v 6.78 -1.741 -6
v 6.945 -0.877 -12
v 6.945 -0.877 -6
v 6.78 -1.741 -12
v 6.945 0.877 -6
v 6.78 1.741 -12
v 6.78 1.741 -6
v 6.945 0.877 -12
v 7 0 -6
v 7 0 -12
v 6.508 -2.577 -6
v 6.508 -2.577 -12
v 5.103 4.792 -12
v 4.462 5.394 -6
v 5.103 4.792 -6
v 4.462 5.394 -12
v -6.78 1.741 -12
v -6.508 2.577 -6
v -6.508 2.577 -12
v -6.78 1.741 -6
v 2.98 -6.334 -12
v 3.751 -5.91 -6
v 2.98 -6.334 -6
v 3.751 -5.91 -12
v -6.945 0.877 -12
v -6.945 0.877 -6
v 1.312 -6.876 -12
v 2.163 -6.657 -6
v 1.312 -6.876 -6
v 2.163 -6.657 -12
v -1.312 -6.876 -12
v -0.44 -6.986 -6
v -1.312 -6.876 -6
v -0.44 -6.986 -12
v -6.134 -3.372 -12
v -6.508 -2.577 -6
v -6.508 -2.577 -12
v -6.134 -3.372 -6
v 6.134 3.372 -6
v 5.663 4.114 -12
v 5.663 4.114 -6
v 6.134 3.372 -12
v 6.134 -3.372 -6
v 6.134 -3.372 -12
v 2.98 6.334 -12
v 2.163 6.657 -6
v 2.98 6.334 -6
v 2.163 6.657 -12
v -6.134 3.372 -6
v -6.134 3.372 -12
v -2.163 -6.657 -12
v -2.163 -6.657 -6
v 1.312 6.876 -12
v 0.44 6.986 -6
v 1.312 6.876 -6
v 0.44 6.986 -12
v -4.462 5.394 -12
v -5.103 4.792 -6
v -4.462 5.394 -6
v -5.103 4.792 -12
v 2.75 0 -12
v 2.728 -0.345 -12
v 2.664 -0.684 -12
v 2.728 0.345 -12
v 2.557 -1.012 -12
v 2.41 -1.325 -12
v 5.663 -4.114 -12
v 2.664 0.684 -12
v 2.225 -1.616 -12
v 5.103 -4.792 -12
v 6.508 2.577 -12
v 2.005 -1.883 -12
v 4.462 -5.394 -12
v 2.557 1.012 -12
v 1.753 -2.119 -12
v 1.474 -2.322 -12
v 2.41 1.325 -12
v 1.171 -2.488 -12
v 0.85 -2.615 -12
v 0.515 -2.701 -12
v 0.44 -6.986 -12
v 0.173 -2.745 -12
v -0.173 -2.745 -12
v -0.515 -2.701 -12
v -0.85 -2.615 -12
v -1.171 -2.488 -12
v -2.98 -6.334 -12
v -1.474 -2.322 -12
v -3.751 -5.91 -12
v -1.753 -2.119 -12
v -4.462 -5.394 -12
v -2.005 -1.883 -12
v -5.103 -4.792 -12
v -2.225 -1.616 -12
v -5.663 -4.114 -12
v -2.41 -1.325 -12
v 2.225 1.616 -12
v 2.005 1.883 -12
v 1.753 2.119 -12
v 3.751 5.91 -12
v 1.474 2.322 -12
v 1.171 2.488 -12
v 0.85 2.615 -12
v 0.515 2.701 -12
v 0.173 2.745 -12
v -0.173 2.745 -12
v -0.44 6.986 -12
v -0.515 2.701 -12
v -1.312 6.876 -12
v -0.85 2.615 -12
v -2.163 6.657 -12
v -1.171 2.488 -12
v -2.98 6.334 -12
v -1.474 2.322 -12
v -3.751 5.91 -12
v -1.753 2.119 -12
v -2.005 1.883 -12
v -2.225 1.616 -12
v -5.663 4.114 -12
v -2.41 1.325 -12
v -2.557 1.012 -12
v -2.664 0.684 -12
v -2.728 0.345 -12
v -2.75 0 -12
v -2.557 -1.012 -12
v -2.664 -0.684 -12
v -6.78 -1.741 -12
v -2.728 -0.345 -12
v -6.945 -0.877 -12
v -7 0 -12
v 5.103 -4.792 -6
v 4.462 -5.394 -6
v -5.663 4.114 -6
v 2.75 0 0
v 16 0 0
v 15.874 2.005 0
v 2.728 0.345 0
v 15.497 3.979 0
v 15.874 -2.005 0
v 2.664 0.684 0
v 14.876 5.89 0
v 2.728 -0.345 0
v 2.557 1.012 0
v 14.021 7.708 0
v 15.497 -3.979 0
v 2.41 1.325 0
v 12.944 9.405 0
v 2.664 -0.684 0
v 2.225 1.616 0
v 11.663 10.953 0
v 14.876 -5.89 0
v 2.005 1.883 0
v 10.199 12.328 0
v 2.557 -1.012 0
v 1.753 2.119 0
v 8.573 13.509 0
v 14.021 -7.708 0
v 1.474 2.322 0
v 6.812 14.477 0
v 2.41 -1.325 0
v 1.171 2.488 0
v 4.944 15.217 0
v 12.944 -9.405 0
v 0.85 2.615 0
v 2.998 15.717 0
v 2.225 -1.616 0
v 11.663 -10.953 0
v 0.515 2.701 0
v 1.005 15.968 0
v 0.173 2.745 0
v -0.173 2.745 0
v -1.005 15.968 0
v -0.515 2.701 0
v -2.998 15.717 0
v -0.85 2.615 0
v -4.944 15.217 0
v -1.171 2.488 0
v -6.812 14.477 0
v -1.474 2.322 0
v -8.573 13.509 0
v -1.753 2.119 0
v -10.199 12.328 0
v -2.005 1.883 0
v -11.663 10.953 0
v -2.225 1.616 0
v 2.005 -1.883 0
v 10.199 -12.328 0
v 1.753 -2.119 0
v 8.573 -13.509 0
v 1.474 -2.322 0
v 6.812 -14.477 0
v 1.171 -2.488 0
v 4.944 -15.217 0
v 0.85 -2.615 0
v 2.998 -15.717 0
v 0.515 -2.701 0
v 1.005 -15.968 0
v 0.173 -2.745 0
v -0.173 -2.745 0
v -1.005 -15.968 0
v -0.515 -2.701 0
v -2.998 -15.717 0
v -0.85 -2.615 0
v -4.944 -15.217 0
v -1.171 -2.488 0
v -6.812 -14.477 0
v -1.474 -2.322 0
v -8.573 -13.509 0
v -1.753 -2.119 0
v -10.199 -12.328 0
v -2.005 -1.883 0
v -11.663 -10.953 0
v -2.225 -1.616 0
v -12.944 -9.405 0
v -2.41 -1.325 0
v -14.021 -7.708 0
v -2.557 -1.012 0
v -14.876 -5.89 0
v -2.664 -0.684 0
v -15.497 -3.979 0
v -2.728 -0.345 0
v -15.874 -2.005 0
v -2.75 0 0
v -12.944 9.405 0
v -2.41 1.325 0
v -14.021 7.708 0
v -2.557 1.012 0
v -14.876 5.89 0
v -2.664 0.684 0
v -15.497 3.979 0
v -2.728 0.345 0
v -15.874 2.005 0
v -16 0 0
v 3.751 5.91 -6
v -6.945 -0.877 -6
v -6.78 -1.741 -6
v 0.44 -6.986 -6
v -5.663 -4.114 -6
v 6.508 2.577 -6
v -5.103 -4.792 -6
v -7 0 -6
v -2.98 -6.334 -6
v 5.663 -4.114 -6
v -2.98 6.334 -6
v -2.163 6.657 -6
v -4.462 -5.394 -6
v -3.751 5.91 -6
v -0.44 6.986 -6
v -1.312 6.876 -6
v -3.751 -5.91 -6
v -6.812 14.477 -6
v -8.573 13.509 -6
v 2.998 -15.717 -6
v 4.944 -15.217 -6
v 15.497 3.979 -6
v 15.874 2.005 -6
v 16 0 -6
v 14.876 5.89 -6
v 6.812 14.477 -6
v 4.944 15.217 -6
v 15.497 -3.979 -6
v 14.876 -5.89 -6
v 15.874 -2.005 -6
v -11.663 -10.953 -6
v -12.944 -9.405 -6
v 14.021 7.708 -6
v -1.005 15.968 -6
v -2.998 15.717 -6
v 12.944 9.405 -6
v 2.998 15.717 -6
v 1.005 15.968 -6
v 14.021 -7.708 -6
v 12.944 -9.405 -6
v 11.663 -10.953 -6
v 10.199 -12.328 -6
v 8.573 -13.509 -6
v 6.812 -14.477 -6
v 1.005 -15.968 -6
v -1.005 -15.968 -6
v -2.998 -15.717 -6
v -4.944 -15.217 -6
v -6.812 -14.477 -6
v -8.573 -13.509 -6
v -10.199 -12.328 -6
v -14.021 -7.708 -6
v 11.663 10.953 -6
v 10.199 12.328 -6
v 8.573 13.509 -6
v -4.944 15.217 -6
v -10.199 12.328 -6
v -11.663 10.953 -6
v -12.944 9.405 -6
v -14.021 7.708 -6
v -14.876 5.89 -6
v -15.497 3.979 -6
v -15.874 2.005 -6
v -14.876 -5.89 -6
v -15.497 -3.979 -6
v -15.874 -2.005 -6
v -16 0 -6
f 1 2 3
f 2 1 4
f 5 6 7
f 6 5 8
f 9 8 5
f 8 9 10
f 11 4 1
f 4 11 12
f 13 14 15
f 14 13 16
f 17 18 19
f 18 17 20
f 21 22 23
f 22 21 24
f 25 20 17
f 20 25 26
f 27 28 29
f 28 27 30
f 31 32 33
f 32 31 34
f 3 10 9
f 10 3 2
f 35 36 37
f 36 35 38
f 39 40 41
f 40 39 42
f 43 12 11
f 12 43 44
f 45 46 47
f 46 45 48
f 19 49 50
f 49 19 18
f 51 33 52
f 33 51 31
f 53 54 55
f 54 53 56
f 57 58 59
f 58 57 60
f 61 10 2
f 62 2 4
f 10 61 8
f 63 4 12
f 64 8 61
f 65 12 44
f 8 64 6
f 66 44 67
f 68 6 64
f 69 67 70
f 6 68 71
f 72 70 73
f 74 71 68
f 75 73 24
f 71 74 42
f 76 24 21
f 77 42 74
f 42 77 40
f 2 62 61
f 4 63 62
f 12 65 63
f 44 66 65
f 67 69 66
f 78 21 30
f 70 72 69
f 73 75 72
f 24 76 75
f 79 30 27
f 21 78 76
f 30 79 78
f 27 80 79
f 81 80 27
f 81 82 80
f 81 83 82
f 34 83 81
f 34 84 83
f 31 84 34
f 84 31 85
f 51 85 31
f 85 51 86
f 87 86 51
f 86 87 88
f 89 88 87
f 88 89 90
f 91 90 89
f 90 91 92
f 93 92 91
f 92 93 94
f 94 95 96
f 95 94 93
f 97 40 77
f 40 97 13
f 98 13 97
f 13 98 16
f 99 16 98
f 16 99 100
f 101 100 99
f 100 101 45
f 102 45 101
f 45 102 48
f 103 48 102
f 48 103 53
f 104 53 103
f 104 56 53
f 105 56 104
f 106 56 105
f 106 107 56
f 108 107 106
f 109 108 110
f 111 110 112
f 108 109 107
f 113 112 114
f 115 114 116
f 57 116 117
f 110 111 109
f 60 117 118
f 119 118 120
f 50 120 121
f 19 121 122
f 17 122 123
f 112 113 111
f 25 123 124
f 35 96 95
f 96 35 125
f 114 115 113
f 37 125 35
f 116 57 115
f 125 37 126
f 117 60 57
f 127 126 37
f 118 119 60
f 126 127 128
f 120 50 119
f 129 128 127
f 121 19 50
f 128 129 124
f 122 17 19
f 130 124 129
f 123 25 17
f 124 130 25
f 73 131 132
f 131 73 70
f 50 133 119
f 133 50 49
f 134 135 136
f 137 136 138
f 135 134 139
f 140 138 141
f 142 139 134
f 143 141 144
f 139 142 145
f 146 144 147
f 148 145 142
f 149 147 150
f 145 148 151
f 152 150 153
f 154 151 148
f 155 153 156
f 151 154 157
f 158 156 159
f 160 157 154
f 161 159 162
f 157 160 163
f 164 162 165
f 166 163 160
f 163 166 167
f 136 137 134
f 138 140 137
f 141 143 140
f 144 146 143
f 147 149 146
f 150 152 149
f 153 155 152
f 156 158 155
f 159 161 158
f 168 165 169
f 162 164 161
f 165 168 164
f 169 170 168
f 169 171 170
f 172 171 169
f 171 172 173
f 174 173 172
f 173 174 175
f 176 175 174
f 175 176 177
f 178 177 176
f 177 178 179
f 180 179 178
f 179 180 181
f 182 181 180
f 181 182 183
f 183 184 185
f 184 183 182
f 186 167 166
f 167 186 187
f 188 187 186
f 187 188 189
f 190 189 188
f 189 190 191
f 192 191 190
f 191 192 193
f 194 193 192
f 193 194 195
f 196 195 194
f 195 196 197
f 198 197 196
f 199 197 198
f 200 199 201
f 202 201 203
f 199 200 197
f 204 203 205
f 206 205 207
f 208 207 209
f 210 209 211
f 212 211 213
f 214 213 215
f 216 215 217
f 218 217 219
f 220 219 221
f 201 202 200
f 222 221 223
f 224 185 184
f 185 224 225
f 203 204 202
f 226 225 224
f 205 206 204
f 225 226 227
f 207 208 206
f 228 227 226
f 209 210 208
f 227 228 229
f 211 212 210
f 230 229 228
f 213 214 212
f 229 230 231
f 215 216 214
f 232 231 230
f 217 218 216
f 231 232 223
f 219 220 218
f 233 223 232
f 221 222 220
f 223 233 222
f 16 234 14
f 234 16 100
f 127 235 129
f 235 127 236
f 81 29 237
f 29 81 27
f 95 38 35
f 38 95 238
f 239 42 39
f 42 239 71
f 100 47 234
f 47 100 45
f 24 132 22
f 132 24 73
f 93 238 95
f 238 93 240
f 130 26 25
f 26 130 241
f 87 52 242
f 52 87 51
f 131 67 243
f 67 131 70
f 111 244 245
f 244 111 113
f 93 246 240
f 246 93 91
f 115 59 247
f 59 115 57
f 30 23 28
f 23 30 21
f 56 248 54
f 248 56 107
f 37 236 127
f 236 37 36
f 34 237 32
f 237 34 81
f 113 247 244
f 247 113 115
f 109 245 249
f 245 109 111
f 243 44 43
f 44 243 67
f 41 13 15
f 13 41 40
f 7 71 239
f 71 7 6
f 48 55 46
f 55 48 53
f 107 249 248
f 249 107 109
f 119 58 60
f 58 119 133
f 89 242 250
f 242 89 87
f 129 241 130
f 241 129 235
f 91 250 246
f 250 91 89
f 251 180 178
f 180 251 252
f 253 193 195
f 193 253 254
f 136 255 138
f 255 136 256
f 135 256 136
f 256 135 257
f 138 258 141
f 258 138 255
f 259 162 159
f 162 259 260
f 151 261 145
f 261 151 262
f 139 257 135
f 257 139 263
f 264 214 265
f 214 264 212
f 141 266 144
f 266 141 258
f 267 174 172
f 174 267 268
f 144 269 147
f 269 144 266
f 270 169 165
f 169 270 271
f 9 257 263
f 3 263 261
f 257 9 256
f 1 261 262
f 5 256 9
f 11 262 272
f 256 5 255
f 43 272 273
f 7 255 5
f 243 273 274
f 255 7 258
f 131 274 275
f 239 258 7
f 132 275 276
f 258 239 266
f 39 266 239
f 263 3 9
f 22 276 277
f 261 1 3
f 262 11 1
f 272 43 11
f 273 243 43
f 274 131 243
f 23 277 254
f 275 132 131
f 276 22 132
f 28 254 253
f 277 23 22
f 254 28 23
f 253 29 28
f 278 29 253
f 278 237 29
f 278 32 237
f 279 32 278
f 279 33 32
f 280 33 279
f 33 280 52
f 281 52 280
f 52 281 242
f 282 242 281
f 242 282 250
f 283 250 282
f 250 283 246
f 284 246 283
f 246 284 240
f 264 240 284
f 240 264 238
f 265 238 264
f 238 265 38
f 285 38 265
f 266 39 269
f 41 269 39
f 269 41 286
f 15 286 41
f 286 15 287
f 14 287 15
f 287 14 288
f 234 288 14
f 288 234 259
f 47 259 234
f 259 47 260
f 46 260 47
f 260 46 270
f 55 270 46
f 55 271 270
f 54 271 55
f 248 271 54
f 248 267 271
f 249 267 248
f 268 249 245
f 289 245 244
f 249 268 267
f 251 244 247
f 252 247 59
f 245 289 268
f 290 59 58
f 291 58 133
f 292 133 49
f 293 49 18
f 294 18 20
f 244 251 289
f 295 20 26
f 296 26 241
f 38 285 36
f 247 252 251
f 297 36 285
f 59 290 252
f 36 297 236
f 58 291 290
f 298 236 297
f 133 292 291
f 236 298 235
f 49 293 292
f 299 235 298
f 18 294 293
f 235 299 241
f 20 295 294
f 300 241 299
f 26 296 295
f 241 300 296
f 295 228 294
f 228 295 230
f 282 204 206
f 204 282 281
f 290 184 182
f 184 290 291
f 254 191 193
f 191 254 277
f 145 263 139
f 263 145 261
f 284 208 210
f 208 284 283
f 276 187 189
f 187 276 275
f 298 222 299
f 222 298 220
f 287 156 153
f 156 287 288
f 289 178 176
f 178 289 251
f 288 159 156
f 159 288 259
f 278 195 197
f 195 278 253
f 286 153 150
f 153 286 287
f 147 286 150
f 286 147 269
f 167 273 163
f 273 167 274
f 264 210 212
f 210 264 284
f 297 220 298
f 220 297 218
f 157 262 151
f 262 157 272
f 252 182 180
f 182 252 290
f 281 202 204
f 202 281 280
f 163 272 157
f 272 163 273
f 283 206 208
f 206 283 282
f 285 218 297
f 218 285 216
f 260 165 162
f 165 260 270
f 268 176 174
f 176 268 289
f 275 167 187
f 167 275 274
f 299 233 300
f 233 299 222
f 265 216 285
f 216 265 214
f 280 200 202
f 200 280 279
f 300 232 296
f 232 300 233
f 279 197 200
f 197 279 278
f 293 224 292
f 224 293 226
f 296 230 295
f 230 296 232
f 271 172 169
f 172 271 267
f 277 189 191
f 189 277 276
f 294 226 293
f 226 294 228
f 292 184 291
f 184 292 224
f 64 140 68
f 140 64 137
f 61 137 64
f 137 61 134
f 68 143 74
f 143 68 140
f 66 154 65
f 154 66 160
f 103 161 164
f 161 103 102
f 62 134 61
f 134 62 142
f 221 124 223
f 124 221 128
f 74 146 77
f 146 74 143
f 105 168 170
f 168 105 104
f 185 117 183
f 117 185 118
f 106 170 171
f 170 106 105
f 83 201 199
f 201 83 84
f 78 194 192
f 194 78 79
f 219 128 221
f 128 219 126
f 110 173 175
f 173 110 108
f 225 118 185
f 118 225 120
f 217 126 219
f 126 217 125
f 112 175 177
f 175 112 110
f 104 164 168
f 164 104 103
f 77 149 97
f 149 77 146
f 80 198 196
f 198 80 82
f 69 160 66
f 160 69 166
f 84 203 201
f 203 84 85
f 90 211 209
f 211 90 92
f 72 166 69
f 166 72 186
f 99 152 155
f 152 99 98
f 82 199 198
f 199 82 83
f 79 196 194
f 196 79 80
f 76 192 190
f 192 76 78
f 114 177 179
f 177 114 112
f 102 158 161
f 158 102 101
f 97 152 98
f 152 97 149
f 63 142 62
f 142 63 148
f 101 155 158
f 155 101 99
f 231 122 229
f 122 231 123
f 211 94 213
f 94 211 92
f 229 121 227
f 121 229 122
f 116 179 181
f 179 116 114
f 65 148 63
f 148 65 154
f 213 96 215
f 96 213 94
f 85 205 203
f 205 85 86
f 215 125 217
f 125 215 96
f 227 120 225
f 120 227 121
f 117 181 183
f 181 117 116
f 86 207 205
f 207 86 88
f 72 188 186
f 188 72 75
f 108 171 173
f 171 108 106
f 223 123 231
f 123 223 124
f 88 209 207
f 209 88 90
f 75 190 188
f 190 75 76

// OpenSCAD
$fn = 50;


difference() {
	union() {
		translate(v = [0, 0, -12.0000000000]) {
			cylinder(h = 12, r = 7.0000000000);
		}
		translate(v = [0, 0, -6.0000000000]) {
			cylinder(h = 6, r = 16.0000000000);
		}
	}
	union() {
		#translate(v = [0, 0, -12]) {
			cylinder(h = 12, r = 2.7500000000);
		}
	}
}
